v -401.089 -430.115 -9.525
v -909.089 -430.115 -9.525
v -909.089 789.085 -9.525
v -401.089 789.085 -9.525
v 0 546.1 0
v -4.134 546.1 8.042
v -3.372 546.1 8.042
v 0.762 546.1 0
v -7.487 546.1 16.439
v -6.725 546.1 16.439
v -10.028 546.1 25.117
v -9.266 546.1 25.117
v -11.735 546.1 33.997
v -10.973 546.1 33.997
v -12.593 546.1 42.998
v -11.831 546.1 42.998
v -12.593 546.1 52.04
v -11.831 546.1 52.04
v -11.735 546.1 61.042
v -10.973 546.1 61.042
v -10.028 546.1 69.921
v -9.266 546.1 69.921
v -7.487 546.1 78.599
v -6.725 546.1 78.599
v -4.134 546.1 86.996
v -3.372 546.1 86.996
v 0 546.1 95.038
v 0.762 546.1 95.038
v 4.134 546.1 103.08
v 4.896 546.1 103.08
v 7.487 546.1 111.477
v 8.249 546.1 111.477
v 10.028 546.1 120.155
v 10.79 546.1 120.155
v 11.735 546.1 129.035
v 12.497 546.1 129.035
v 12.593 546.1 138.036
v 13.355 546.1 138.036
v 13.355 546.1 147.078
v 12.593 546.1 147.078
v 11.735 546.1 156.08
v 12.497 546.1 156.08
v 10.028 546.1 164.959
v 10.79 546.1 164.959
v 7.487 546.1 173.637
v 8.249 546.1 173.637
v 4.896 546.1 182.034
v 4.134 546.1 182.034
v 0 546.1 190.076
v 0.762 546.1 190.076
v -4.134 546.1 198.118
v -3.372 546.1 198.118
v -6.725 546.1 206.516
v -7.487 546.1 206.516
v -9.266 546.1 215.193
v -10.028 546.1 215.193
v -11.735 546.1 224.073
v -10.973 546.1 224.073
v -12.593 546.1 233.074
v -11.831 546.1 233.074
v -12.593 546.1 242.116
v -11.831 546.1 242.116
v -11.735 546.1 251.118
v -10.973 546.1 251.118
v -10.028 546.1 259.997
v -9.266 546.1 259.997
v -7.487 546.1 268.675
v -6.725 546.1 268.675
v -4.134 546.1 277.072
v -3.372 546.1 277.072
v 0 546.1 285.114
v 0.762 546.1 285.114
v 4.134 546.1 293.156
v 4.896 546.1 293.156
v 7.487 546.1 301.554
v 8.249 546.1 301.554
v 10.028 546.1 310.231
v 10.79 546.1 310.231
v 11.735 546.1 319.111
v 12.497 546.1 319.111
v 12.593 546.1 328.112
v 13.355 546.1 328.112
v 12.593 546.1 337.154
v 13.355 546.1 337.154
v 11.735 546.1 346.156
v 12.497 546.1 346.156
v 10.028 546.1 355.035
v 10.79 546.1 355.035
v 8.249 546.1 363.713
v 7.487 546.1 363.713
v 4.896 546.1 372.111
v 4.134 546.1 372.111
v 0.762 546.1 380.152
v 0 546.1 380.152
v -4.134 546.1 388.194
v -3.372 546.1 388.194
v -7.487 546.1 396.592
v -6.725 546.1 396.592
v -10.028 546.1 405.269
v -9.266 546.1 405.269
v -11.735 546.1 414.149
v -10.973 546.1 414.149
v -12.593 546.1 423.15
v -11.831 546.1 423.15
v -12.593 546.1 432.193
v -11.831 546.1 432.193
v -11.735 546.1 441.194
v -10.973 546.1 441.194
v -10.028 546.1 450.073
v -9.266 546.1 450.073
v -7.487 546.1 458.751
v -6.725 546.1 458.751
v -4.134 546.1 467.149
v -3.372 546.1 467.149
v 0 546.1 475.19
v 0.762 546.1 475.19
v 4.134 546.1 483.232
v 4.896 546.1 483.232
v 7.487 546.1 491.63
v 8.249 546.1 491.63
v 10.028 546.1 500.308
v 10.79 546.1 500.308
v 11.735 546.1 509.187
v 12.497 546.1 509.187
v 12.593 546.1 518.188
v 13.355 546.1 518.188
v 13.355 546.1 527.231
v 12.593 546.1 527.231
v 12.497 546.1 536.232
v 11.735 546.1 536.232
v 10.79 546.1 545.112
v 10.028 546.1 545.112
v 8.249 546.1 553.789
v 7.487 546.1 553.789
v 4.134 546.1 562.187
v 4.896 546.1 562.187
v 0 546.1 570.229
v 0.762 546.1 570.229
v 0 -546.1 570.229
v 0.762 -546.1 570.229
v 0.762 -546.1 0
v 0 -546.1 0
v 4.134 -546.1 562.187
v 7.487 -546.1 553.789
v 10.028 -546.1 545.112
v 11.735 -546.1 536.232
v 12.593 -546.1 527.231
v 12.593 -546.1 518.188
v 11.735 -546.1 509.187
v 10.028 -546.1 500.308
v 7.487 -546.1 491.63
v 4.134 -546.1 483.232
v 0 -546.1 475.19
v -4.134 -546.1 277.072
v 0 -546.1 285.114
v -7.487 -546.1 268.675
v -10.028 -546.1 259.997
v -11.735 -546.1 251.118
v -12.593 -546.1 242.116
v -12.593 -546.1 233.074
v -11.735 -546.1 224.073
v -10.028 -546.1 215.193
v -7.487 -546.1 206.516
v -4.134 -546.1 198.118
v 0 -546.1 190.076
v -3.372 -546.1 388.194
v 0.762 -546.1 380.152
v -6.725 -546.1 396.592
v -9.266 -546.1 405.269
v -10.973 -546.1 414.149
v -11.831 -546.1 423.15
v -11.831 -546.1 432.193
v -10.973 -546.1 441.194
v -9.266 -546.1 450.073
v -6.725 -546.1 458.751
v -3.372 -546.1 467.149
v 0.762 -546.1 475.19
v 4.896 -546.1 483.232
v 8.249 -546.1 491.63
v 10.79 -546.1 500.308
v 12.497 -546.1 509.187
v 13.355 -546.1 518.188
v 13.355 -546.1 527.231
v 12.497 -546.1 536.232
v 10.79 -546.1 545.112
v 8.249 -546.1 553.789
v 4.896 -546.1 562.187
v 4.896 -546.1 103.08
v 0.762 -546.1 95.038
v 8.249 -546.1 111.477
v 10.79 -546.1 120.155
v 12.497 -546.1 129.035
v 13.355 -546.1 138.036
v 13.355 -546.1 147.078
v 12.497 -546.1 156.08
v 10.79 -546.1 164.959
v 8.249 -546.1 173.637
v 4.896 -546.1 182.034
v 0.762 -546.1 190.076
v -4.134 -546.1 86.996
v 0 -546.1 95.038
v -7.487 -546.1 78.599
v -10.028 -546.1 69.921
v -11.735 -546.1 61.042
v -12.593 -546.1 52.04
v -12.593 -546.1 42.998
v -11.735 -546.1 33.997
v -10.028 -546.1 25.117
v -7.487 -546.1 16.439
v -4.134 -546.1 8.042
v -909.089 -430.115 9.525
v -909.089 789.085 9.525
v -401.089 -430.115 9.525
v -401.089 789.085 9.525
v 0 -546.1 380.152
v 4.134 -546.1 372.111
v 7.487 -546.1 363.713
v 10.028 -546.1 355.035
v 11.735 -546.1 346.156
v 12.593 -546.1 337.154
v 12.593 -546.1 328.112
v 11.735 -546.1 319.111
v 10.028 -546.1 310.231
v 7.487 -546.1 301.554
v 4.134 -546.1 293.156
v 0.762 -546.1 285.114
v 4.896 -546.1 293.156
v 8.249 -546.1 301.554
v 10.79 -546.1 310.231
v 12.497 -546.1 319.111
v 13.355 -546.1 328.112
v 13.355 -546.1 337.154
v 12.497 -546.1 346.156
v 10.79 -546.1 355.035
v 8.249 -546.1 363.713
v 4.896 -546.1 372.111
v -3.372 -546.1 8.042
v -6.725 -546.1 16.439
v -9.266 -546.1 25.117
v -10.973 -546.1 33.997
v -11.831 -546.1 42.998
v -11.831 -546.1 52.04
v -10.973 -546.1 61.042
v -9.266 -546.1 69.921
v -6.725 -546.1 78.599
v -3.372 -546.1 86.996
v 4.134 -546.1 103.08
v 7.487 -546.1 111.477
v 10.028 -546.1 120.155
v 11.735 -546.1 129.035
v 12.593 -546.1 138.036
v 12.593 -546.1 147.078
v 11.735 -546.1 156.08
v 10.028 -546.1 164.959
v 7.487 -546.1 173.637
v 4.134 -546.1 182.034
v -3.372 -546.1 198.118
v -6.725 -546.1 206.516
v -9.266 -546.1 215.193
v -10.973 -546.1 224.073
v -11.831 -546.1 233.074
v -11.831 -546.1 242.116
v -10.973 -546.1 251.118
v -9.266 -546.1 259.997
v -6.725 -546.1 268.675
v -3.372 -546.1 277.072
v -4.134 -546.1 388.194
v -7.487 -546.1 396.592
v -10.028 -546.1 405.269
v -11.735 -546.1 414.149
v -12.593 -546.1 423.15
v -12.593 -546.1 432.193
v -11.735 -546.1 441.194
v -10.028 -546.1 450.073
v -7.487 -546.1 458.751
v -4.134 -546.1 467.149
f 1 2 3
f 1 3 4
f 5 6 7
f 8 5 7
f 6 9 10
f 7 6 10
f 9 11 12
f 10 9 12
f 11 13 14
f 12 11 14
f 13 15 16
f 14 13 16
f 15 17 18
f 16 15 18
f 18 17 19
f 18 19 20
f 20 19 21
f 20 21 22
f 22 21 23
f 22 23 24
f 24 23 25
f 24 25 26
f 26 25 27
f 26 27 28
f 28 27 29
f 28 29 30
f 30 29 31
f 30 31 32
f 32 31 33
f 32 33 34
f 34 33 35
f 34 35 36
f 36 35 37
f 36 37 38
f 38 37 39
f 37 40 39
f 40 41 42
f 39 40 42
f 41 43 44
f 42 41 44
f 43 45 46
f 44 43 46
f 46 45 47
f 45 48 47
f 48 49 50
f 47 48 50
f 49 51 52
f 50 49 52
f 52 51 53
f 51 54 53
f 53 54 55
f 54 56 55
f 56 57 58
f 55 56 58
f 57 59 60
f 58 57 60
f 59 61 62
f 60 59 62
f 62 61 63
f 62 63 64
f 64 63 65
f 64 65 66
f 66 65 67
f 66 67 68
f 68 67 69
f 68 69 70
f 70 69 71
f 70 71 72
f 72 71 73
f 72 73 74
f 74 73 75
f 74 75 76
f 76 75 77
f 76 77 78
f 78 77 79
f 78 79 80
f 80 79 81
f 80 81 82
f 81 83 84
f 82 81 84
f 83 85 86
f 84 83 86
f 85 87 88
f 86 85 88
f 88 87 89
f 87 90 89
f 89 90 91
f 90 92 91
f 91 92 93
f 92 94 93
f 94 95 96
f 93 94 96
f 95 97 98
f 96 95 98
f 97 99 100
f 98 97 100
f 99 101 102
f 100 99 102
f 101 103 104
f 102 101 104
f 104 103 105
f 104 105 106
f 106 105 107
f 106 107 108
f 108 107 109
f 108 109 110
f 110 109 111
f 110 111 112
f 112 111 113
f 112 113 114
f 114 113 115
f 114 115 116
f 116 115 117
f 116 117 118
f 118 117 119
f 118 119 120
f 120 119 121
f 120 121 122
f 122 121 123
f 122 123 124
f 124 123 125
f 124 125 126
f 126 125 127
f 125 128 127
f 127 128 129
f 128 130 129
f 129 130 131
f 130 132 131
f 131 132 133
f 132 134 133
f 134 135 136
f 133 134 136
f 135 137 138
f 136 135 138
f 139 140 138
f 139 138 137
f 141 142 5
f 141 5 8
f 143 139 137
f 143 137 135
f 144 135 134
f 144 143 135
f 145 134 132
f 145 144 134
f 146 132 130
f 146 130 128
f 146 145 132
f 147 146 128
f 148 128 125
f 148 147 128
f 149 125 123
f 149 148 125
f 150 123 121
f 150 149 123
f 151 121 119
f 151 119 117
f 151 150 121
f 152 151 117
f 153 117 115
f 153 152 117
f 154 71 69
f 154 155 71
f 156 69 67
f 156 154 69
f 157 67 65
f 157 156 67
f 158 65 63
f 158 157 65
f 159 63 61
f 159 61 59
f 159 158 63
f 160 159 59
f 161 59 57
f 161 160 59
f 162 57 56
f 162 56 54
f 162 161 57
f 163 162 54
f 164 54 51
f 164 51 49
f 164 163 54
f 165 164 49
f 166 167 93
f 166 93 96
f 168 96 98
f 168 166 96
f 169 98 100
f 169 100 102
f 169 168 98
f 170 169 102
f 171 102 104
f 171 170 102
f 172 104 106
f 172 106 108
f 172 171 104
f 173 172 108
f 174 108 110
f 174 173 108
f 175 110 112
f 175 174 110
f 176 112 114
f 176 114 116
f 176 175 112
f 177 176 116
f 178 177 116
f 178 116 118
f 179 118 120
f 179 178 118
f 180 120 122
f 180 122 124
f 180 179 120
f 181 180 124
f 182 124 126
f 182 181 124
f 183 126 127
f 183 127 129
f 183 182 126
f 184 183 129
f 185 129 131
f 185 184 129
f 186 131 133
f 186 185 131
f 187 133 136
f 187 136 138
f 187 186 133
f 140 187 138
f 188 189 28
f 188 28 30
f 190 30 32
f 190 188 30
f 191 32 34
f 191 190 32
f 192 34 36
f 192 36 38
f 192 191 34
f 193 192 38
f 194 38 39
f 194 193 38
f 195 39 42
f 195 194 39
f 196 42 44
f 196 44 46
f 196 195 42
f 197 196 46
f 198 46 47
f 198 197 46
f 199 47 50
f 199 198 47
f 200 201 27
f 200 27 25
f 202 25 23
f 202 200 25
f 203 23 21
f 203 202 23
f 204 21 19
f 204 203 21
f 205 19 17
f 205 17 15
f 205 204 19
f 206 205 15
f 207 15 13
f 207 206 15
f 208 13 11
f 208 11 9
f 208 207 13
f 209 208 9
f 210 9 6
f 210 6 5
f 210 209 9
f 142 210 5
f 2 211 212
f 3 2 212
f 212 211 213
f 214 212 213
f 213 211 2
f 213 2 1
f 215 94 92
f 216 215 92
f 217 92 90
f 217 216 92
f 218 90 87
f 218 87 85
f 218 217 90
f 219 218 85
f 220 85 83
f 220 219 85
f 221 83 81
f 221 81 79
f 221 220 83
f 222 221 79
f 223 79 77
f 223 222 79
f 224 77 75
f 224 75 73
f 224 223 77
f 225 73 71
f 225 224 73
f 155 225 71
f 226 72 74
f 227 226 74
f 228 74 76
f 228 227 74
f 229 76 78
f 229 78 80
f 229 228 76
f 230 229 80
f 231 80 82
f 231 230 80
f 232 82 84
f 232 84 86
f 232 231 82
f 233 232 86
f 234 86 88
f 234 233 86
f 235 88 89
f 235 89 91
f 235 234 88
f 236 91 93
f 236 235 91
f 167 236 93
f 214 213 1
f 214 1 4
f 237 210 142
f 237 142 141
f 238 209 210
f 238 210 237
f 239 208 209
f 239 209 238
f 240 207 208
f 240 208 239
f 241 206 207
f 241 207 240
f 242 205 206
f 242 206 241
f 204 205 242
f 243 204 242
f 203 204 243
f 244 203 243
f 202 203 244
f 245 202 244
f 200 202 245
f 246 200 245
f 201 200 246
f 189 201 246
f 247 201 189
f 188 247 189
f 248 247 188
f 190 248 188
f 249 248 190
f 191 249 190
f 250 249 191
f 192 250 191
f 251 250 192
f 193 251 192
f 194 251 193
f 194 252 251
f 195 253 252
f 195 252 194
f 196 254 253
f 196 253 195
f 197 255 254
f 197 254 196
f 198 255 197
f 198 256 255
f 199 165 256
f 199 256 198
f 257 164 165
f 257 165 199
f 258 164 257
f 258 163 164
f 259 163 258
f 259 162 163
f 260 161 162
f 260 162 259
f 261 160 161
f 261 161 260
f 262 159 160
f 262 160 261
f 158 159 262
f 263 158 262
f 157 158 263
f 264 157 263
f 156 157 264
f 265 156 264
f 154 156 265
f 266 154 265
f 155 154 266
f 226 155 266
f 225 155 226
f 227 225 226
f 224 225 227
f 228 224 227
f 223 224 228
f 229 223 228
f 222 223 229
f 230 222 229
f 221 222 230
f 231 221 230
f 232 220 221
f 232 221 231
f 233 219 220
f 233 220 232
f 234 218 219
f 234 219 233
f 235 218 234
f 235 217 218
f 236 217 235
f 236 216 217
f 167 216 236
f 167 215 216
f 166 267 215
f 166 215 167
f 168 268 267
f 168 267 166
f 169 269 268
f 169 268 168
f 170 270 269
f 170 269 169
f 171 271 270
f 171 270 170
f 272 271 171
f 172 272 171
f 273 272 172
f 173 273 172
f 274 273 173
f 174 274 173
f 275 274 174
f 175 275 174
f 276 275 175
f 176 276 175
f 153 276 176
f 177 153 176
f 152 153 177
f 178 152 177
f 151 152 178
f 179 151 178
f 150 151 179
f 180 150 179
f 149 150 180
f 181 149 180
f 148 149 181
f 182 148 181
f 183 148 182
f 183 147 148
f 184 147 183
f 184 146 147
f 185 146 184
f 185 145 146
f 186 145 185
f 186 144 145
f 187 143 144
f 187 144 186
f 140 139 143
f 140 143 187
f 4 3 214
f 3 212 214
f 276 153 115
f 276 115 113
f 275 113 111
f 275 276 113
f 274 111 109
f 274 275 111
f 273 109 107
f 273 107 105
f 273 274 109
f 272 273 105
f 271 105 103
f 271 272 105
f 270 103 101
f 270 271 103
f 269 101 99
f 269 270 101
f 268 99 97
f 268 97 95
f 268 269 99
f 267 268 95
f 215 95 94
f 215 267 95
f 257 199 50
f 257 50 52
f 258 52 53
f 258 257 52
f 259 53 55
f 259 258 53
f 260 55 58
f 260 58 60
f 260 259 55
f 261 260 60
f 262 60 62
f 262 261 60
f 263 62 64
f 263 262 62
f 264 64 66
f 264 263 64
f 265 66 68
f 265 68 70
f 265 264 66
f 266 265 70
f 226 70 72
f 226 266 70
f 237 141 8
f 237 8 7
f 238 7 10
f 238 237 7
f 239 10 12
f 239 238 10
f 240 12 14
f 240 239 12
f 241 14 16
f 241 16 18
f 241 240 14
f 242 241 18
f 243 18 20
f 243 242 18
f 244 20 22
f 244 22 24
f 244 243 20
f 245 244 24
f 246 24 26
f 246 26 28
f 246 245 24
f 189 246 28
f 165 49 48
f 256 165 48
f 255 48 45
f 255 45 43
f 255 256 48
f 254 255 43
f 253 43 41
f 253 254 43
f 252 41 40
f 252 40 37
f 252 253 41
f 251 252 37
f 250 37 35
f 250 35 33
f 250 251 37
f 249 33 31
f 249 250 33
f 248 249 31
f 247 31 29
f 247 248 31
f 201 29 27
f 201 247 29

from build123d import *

# Parameters (mm, degrees)
F1_DEPTH = 546.1
F2_W     = 508
F2_H     = 1219.2
F3_DEPTH = 9.525


with BuildPart() as f1:
    # F0 (on Front) → F1 (new body, symmetric)
    with BuildSketch(Plane.XZ):
        with BuildLine():
            ThreePointArc((0, 190.076195), (12.7, 142.557146), (0, 95.038098))
            ThreePointArc((0, 95.038098), (-12.7, 47.519049), (0, 0))
            Line((0, 0), (0.762, 0))
            ThreePointArc((0.762, 0), (-11.938, 47.519049), (0.762, 95.038098))
            ThreePointArc((0.762, 95.038098), (13.462, 142.557146), (0.762, 190.076195))
            ThreePointArc((0.762, 190.076195), (-11.938, 237.595244), (0.762, 285.114293))
            ThreePointArc((0.762, 285.114293), (13.462, 332.633342), (0.762, 380.15239))
            ThreePointArc((0.762, 380.15239), (-11.938, 427.671439), (0.762, 475.190488))
            ThreePointArc((0.762, 475.190488), (13.462, 522.709537), (0.762, 570.228586))
            Line((0.762, 570.228586), (0, 570.228586))
            ThreePointArc((0, 570.228586), (12.7, 522.709537), (0, 475.190488))
            ThreePointArc((0, 475.190488), (-12.7, 427.671439), (0, 380.15239))
            ThreePointArc((0, 380.15239), (12.7, 332.633342), (0, 285.114293))
            ThreePointArc((0, 285.114293), (-12.7, 237.595244), (0, 190.076195))
        make_face()
    extrude(amount=F1_DEPTH, both=True)


with BuildPart() as f3:
    # F2 (on Top) → F3 (new body, symmetric)
    with BuildSketch(Plane.XY):
        with Locations((-655.088946, 179.48472)):
            Rectangle(F2_W, F2_H)
    extrude(amount=F3_DEPTH, both=True)


solid = Compound([f1.part, f3.part])
